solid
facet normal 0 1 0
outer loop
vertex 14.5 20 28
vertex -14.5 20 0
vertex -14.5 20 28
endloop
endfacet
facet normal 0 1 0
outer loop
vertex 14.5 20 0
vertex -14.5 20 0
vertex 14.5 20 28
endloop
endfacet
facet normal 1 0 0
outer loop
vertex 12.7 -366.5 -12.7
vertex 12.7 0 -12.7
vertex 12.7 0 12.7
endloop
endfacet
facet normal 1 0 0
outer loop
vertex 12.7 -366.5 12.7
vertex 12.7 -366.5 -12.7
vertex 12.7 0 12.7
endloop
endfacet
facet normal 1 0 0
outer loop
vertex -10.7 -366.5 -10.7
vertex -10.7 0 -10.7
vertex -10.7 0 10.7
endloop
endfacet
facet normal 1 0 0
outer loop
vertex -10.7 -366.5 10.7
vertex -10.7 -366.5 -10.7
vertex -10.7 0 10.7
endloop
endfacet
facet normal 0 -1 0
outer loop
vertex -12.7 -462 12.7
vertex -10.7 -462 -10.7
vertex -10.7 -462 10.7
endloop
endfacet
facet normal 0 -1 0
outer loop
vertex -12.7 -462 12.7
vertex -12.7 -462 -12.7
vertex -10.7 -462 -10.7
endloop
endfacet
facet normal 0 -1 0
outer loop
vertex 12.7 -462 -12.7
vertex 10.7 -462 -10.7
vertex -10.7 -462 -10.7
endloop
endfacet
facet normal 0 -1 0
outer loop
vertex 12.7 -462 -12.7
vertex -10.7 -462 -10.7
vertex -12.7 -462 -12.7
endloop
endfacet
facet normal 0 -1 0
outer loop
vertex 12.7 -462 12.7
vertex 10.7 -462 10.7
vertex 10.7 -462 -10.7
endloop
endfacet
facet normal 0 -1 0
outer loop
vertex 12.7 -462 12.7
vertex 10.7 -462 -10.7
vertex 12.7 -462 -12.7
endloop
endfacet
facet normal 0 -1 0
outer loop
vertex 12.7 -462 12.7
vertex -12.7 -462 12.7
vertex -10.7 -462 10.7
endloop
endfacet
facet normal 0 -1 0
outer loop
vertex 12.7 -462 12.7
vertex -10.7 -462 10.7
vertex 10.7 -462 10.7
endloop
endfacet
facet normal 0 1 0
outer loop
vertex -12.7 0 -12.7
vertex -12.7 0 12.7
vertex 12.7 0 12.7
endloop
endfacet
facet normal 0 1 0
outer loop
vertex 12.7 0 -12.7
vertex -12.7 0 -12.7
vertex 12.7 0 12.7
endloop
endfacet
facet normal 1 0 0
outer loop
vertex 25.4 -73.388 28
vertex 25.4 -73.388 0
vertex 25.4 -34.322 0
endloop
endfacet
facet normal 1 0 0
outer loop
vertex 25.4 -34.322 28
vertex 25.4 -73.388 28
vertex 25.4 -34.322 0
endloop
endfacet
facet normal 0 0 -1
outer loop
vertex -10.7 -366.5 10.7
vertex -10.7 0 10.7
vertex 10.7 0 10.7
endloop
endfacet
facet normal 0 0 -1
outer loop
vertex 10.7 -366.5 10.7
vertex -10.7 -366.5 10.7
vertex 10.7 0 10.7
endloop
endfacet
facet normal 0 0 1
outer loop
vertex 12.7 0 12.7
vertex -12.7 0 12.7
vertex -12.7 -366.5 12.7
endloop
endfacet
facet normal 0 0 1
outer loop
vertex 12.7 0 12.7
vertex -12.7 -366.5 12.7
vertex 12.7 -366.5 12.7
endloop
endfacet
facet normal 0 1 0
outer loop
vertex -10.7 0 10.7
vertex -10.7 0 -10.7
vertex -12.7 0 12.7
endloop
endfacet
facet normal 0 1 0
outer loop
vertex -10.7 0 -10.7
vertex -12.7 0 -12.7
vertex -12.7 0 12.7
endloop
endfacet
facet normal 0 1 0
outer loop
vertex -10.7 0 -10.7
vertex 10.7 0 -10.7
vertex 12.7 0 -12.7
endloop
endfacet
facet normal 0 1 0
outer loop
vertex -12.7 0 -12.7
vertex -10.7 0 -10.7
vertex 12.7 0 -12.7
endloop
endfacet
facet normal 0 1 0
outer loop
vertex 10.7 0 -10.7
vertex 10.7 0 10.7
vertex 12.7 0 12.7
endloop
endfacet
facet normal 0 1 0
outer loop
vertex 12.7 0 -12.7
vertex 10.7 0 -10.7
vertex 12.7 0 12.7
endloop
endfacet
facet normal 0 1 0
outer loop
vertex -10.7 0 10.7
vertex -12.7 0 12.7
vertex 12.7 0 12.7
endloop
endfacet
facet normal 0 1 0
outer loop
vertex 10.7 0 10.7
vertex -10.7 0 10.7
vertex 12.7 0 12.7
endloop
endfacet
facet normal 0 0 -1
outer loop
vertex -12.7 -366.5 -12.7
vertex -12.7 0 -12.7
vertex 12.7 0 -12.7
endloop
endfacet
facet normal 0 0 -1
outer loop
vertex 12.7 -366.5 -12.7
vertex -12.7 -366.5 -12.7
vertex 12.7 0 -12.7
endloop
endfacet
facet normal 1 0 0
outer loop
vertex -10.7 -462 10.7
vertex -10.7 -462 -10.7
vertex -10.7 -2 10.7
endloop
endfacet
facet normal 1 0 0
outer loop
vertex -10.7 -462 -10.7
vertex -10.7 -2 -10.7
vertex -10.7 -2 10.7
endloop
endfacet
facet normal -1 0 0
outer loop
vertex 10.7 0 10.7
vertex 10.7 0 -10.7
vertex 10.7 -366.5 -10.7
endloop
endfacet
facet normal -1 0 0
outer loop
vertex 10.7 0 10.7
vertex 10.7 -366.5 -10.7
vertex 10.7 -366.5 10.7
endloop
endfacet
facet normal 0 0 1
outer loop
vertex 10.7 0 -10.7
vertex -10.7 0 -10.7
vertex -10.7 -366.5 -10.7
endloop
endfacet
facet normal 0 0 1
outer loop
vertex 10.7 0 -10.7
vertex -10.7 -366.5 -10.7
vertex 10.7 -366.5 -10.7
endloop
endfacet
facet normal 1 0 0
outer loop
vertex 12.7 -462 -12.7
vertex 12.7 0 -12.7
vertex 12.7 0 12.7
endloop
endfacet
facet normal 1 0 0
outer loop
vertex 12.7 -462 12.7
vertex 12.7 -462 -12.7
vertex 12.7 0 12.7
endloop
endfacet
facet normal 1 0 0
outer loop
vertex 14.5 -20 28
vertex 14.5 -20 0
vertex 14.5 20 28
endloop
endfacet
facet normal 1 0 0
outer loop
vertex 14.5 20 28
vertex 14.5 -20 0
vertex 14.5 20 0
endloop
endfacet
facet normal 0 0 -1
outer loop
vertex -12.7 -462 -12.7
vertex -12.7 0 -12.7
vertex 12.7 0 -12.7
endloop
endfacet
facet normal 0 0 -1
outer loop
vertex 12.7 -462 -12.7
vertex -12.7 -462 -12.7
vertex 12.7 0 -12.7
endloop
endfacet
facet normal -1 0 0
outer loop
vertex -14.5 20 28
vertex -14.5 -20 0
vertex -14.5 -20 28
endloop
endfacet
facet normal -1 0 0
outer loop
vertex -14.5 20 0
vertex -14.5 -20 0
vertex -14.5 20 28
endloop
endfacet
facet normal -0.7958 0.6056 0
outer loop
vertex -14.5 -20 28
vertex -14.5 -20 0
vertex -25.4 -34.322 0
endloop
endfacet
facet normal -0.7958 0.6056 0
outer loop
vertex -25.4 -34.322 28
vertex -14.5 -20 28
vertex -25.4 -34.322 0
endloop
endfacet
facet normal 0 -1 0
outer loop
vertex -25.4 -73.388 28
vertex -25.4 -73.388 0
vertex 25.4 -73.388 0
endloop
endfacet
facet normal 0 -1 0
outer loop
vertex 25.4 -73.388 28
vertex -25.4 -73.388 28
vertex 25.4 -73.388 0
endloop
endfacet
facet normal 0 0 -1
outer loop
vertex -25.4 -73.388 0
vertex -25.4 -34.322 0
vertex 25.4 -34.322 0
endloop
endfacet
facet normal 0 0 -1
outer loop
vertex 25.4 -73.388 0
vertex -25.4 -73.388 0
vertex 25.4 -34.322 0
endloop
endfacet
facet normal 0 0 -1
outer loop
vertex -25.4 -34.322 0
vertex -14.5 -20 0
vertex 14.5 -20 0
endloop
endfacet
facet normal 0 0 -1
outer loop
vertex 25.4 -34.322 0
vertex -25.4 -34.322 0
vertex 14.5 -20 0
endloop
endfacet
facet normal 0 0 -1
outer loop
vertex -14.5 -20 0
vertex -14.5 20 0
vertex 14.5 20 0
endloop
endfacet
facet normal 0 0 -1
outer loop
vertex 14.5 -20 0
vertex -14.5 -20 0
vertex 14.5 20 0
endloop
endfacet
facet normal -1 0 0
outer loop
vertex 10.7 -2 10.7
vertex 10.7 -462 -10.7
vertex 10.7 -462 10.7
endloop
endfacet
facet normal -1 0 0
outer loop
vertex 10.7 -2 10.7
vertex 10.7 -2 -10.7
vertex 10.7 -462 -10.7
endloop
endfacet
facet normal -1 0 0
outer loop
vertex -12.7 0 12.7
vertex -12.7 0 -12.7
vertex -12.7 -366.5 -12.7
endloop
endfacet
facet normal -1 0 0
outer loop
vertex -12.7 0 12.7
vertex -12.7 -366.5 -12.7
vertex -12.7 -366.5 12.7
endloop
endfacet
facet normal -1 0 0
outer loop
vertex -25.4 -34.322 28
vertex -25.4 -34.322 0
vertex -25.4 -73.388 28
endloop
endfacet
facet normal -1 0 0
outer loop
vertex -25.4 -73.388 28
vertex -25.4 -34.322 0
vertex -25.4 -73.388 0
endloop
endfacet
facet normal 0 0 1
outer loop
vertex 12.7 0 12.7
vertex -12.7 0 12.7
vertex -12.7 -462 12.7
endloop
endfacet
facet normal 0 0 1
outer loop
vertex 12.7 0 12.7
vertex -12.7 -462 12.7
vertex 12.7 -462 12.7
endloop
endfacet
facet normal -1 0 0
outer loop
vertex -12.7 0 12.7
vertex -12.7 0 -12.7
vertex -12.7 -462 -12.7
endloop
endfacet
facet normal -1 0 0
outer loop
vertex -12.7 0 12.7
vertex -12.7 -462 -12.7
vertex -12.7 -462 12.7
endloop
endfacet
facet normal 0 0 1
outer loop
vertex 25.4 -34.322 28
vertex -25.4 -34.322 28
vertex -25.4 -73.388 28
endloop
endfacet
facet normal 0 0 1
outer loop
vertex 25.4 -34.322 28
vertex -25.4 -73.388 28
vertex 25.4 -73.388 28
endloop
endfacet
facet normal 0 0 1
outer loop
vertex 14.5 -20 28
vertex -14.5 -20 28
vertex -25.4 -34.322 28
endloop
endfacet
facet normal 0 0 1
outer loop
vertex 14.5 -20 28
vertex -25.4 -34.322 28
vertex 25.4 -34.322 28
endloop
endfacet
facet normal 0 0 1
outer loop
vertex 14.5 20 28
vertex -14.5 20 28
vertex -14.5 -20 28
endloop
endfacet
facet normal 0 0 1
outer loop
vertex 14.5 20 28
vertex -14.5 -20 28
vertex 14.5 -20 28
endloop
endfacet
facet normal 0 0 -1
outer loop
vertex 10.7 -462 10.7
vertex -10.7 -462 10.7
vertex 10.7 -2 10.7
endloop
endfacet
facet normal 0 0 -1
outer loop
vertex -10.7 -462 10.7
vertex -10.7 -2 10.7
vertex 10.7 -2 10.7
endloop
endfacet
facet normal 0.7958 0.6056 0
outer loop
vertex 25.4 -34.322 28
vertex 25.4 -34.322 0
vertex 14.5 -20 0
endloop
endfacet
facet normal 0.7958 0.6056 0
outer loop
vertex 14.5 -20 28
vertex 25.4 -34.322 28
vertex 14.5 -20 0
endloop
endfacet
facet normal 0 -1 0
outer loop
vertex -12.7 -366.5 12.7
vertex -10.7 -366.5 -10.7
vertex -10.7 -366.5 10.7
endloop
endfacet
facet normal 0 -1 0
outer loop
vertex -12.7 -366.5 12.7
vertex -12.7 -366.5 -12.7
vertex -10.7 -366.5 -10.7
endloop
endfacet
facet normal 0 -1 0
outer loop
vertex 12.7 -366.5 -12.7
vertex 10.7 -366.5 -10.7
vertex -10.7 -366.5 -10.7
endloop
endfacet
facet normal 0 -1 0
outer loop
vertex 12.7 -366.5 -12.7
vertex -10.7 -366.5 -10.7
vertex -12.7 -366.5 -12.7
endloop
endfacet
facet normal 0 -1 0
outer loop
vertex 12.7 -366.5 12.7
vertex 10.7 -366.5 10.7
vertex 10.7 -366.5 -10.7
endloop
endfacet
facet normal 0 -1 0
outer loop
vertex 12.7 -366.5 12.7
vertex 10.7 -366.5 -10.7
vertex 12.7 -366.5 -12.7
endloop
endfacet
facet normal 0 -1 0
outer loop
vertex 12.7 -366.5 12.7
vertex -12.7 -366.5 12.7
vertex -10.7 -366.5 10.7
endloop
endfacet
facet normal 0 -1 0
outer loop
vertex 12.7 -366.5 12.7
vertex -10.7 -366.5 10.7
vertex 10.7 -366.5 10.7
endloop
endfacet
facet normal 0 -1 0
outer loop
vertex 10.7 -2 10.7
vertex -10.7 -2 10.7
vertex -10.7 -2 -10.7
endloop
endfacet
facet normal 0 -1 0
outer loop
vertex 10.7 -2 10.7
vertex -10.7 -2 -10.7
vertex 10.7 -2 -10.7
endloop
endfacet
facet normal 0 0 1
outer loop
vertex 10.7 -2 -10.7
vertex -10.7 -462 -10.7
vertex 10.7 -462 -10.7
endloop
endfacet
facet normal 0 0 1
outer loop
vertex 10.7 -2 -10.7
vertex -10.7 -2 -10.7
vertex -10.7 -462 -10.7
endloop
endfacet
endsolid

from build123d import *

# Parameters (mm, degrees)
F0_W     = 25.4
F0_H     = 25.4
F1_DEPTH = 462
F2_T     = -2
F3_DEPTH = 366.5
F4_T     = -2
F5_W     = 29
F5_H     = 40
F6_DEPTH = 28


with BuildPart() as f1:
    # F0 (on Front) → F1 (new body)
    with BuildSketch(Plane.XZ):
        Rectangle(F0_W, F0_H)
    extrude(amount=F1_DEPTH)

    # F2
    f2_openings = [f1.faces().sort_by_distance(p)[0] for p in [
        (0, -462, 0),
    ]]
    offset(amount=F2_T, openings=f2_openings)


with BuildPart() as f3:
    # F0 (on Front) → F3 (new body)
    with BuildSketch(Plane.XZ):
        Rectangle(F0_W, F0_H)
    extrude(amount=F3_DEPTH)

    # F4
    f4_openings = [f3.faces().sort_by_distance(p)[0] for p in [
        (0, -366.5, 0),
        (0, 0, 0),
    ]]
    offset(amount=F4_T, openings=f4_openings)


with BuildPart() as f6:
    # F5 (on Top) → F6 (new body)
    with BuildSketch(Plane.XY):
        Rectangle(F5_W, F5_H)
        Polygon((14.5, -20), (-14.5, -20), (-25.4, -34.322258085), (-25.4, -73.387689568), (25.4, -73.387689568), (25.4, -34.322258085), align=None)
    extrude(amount=F6_DEPTH)


solid = Compound([f1.part, f3.part, f6.part])
